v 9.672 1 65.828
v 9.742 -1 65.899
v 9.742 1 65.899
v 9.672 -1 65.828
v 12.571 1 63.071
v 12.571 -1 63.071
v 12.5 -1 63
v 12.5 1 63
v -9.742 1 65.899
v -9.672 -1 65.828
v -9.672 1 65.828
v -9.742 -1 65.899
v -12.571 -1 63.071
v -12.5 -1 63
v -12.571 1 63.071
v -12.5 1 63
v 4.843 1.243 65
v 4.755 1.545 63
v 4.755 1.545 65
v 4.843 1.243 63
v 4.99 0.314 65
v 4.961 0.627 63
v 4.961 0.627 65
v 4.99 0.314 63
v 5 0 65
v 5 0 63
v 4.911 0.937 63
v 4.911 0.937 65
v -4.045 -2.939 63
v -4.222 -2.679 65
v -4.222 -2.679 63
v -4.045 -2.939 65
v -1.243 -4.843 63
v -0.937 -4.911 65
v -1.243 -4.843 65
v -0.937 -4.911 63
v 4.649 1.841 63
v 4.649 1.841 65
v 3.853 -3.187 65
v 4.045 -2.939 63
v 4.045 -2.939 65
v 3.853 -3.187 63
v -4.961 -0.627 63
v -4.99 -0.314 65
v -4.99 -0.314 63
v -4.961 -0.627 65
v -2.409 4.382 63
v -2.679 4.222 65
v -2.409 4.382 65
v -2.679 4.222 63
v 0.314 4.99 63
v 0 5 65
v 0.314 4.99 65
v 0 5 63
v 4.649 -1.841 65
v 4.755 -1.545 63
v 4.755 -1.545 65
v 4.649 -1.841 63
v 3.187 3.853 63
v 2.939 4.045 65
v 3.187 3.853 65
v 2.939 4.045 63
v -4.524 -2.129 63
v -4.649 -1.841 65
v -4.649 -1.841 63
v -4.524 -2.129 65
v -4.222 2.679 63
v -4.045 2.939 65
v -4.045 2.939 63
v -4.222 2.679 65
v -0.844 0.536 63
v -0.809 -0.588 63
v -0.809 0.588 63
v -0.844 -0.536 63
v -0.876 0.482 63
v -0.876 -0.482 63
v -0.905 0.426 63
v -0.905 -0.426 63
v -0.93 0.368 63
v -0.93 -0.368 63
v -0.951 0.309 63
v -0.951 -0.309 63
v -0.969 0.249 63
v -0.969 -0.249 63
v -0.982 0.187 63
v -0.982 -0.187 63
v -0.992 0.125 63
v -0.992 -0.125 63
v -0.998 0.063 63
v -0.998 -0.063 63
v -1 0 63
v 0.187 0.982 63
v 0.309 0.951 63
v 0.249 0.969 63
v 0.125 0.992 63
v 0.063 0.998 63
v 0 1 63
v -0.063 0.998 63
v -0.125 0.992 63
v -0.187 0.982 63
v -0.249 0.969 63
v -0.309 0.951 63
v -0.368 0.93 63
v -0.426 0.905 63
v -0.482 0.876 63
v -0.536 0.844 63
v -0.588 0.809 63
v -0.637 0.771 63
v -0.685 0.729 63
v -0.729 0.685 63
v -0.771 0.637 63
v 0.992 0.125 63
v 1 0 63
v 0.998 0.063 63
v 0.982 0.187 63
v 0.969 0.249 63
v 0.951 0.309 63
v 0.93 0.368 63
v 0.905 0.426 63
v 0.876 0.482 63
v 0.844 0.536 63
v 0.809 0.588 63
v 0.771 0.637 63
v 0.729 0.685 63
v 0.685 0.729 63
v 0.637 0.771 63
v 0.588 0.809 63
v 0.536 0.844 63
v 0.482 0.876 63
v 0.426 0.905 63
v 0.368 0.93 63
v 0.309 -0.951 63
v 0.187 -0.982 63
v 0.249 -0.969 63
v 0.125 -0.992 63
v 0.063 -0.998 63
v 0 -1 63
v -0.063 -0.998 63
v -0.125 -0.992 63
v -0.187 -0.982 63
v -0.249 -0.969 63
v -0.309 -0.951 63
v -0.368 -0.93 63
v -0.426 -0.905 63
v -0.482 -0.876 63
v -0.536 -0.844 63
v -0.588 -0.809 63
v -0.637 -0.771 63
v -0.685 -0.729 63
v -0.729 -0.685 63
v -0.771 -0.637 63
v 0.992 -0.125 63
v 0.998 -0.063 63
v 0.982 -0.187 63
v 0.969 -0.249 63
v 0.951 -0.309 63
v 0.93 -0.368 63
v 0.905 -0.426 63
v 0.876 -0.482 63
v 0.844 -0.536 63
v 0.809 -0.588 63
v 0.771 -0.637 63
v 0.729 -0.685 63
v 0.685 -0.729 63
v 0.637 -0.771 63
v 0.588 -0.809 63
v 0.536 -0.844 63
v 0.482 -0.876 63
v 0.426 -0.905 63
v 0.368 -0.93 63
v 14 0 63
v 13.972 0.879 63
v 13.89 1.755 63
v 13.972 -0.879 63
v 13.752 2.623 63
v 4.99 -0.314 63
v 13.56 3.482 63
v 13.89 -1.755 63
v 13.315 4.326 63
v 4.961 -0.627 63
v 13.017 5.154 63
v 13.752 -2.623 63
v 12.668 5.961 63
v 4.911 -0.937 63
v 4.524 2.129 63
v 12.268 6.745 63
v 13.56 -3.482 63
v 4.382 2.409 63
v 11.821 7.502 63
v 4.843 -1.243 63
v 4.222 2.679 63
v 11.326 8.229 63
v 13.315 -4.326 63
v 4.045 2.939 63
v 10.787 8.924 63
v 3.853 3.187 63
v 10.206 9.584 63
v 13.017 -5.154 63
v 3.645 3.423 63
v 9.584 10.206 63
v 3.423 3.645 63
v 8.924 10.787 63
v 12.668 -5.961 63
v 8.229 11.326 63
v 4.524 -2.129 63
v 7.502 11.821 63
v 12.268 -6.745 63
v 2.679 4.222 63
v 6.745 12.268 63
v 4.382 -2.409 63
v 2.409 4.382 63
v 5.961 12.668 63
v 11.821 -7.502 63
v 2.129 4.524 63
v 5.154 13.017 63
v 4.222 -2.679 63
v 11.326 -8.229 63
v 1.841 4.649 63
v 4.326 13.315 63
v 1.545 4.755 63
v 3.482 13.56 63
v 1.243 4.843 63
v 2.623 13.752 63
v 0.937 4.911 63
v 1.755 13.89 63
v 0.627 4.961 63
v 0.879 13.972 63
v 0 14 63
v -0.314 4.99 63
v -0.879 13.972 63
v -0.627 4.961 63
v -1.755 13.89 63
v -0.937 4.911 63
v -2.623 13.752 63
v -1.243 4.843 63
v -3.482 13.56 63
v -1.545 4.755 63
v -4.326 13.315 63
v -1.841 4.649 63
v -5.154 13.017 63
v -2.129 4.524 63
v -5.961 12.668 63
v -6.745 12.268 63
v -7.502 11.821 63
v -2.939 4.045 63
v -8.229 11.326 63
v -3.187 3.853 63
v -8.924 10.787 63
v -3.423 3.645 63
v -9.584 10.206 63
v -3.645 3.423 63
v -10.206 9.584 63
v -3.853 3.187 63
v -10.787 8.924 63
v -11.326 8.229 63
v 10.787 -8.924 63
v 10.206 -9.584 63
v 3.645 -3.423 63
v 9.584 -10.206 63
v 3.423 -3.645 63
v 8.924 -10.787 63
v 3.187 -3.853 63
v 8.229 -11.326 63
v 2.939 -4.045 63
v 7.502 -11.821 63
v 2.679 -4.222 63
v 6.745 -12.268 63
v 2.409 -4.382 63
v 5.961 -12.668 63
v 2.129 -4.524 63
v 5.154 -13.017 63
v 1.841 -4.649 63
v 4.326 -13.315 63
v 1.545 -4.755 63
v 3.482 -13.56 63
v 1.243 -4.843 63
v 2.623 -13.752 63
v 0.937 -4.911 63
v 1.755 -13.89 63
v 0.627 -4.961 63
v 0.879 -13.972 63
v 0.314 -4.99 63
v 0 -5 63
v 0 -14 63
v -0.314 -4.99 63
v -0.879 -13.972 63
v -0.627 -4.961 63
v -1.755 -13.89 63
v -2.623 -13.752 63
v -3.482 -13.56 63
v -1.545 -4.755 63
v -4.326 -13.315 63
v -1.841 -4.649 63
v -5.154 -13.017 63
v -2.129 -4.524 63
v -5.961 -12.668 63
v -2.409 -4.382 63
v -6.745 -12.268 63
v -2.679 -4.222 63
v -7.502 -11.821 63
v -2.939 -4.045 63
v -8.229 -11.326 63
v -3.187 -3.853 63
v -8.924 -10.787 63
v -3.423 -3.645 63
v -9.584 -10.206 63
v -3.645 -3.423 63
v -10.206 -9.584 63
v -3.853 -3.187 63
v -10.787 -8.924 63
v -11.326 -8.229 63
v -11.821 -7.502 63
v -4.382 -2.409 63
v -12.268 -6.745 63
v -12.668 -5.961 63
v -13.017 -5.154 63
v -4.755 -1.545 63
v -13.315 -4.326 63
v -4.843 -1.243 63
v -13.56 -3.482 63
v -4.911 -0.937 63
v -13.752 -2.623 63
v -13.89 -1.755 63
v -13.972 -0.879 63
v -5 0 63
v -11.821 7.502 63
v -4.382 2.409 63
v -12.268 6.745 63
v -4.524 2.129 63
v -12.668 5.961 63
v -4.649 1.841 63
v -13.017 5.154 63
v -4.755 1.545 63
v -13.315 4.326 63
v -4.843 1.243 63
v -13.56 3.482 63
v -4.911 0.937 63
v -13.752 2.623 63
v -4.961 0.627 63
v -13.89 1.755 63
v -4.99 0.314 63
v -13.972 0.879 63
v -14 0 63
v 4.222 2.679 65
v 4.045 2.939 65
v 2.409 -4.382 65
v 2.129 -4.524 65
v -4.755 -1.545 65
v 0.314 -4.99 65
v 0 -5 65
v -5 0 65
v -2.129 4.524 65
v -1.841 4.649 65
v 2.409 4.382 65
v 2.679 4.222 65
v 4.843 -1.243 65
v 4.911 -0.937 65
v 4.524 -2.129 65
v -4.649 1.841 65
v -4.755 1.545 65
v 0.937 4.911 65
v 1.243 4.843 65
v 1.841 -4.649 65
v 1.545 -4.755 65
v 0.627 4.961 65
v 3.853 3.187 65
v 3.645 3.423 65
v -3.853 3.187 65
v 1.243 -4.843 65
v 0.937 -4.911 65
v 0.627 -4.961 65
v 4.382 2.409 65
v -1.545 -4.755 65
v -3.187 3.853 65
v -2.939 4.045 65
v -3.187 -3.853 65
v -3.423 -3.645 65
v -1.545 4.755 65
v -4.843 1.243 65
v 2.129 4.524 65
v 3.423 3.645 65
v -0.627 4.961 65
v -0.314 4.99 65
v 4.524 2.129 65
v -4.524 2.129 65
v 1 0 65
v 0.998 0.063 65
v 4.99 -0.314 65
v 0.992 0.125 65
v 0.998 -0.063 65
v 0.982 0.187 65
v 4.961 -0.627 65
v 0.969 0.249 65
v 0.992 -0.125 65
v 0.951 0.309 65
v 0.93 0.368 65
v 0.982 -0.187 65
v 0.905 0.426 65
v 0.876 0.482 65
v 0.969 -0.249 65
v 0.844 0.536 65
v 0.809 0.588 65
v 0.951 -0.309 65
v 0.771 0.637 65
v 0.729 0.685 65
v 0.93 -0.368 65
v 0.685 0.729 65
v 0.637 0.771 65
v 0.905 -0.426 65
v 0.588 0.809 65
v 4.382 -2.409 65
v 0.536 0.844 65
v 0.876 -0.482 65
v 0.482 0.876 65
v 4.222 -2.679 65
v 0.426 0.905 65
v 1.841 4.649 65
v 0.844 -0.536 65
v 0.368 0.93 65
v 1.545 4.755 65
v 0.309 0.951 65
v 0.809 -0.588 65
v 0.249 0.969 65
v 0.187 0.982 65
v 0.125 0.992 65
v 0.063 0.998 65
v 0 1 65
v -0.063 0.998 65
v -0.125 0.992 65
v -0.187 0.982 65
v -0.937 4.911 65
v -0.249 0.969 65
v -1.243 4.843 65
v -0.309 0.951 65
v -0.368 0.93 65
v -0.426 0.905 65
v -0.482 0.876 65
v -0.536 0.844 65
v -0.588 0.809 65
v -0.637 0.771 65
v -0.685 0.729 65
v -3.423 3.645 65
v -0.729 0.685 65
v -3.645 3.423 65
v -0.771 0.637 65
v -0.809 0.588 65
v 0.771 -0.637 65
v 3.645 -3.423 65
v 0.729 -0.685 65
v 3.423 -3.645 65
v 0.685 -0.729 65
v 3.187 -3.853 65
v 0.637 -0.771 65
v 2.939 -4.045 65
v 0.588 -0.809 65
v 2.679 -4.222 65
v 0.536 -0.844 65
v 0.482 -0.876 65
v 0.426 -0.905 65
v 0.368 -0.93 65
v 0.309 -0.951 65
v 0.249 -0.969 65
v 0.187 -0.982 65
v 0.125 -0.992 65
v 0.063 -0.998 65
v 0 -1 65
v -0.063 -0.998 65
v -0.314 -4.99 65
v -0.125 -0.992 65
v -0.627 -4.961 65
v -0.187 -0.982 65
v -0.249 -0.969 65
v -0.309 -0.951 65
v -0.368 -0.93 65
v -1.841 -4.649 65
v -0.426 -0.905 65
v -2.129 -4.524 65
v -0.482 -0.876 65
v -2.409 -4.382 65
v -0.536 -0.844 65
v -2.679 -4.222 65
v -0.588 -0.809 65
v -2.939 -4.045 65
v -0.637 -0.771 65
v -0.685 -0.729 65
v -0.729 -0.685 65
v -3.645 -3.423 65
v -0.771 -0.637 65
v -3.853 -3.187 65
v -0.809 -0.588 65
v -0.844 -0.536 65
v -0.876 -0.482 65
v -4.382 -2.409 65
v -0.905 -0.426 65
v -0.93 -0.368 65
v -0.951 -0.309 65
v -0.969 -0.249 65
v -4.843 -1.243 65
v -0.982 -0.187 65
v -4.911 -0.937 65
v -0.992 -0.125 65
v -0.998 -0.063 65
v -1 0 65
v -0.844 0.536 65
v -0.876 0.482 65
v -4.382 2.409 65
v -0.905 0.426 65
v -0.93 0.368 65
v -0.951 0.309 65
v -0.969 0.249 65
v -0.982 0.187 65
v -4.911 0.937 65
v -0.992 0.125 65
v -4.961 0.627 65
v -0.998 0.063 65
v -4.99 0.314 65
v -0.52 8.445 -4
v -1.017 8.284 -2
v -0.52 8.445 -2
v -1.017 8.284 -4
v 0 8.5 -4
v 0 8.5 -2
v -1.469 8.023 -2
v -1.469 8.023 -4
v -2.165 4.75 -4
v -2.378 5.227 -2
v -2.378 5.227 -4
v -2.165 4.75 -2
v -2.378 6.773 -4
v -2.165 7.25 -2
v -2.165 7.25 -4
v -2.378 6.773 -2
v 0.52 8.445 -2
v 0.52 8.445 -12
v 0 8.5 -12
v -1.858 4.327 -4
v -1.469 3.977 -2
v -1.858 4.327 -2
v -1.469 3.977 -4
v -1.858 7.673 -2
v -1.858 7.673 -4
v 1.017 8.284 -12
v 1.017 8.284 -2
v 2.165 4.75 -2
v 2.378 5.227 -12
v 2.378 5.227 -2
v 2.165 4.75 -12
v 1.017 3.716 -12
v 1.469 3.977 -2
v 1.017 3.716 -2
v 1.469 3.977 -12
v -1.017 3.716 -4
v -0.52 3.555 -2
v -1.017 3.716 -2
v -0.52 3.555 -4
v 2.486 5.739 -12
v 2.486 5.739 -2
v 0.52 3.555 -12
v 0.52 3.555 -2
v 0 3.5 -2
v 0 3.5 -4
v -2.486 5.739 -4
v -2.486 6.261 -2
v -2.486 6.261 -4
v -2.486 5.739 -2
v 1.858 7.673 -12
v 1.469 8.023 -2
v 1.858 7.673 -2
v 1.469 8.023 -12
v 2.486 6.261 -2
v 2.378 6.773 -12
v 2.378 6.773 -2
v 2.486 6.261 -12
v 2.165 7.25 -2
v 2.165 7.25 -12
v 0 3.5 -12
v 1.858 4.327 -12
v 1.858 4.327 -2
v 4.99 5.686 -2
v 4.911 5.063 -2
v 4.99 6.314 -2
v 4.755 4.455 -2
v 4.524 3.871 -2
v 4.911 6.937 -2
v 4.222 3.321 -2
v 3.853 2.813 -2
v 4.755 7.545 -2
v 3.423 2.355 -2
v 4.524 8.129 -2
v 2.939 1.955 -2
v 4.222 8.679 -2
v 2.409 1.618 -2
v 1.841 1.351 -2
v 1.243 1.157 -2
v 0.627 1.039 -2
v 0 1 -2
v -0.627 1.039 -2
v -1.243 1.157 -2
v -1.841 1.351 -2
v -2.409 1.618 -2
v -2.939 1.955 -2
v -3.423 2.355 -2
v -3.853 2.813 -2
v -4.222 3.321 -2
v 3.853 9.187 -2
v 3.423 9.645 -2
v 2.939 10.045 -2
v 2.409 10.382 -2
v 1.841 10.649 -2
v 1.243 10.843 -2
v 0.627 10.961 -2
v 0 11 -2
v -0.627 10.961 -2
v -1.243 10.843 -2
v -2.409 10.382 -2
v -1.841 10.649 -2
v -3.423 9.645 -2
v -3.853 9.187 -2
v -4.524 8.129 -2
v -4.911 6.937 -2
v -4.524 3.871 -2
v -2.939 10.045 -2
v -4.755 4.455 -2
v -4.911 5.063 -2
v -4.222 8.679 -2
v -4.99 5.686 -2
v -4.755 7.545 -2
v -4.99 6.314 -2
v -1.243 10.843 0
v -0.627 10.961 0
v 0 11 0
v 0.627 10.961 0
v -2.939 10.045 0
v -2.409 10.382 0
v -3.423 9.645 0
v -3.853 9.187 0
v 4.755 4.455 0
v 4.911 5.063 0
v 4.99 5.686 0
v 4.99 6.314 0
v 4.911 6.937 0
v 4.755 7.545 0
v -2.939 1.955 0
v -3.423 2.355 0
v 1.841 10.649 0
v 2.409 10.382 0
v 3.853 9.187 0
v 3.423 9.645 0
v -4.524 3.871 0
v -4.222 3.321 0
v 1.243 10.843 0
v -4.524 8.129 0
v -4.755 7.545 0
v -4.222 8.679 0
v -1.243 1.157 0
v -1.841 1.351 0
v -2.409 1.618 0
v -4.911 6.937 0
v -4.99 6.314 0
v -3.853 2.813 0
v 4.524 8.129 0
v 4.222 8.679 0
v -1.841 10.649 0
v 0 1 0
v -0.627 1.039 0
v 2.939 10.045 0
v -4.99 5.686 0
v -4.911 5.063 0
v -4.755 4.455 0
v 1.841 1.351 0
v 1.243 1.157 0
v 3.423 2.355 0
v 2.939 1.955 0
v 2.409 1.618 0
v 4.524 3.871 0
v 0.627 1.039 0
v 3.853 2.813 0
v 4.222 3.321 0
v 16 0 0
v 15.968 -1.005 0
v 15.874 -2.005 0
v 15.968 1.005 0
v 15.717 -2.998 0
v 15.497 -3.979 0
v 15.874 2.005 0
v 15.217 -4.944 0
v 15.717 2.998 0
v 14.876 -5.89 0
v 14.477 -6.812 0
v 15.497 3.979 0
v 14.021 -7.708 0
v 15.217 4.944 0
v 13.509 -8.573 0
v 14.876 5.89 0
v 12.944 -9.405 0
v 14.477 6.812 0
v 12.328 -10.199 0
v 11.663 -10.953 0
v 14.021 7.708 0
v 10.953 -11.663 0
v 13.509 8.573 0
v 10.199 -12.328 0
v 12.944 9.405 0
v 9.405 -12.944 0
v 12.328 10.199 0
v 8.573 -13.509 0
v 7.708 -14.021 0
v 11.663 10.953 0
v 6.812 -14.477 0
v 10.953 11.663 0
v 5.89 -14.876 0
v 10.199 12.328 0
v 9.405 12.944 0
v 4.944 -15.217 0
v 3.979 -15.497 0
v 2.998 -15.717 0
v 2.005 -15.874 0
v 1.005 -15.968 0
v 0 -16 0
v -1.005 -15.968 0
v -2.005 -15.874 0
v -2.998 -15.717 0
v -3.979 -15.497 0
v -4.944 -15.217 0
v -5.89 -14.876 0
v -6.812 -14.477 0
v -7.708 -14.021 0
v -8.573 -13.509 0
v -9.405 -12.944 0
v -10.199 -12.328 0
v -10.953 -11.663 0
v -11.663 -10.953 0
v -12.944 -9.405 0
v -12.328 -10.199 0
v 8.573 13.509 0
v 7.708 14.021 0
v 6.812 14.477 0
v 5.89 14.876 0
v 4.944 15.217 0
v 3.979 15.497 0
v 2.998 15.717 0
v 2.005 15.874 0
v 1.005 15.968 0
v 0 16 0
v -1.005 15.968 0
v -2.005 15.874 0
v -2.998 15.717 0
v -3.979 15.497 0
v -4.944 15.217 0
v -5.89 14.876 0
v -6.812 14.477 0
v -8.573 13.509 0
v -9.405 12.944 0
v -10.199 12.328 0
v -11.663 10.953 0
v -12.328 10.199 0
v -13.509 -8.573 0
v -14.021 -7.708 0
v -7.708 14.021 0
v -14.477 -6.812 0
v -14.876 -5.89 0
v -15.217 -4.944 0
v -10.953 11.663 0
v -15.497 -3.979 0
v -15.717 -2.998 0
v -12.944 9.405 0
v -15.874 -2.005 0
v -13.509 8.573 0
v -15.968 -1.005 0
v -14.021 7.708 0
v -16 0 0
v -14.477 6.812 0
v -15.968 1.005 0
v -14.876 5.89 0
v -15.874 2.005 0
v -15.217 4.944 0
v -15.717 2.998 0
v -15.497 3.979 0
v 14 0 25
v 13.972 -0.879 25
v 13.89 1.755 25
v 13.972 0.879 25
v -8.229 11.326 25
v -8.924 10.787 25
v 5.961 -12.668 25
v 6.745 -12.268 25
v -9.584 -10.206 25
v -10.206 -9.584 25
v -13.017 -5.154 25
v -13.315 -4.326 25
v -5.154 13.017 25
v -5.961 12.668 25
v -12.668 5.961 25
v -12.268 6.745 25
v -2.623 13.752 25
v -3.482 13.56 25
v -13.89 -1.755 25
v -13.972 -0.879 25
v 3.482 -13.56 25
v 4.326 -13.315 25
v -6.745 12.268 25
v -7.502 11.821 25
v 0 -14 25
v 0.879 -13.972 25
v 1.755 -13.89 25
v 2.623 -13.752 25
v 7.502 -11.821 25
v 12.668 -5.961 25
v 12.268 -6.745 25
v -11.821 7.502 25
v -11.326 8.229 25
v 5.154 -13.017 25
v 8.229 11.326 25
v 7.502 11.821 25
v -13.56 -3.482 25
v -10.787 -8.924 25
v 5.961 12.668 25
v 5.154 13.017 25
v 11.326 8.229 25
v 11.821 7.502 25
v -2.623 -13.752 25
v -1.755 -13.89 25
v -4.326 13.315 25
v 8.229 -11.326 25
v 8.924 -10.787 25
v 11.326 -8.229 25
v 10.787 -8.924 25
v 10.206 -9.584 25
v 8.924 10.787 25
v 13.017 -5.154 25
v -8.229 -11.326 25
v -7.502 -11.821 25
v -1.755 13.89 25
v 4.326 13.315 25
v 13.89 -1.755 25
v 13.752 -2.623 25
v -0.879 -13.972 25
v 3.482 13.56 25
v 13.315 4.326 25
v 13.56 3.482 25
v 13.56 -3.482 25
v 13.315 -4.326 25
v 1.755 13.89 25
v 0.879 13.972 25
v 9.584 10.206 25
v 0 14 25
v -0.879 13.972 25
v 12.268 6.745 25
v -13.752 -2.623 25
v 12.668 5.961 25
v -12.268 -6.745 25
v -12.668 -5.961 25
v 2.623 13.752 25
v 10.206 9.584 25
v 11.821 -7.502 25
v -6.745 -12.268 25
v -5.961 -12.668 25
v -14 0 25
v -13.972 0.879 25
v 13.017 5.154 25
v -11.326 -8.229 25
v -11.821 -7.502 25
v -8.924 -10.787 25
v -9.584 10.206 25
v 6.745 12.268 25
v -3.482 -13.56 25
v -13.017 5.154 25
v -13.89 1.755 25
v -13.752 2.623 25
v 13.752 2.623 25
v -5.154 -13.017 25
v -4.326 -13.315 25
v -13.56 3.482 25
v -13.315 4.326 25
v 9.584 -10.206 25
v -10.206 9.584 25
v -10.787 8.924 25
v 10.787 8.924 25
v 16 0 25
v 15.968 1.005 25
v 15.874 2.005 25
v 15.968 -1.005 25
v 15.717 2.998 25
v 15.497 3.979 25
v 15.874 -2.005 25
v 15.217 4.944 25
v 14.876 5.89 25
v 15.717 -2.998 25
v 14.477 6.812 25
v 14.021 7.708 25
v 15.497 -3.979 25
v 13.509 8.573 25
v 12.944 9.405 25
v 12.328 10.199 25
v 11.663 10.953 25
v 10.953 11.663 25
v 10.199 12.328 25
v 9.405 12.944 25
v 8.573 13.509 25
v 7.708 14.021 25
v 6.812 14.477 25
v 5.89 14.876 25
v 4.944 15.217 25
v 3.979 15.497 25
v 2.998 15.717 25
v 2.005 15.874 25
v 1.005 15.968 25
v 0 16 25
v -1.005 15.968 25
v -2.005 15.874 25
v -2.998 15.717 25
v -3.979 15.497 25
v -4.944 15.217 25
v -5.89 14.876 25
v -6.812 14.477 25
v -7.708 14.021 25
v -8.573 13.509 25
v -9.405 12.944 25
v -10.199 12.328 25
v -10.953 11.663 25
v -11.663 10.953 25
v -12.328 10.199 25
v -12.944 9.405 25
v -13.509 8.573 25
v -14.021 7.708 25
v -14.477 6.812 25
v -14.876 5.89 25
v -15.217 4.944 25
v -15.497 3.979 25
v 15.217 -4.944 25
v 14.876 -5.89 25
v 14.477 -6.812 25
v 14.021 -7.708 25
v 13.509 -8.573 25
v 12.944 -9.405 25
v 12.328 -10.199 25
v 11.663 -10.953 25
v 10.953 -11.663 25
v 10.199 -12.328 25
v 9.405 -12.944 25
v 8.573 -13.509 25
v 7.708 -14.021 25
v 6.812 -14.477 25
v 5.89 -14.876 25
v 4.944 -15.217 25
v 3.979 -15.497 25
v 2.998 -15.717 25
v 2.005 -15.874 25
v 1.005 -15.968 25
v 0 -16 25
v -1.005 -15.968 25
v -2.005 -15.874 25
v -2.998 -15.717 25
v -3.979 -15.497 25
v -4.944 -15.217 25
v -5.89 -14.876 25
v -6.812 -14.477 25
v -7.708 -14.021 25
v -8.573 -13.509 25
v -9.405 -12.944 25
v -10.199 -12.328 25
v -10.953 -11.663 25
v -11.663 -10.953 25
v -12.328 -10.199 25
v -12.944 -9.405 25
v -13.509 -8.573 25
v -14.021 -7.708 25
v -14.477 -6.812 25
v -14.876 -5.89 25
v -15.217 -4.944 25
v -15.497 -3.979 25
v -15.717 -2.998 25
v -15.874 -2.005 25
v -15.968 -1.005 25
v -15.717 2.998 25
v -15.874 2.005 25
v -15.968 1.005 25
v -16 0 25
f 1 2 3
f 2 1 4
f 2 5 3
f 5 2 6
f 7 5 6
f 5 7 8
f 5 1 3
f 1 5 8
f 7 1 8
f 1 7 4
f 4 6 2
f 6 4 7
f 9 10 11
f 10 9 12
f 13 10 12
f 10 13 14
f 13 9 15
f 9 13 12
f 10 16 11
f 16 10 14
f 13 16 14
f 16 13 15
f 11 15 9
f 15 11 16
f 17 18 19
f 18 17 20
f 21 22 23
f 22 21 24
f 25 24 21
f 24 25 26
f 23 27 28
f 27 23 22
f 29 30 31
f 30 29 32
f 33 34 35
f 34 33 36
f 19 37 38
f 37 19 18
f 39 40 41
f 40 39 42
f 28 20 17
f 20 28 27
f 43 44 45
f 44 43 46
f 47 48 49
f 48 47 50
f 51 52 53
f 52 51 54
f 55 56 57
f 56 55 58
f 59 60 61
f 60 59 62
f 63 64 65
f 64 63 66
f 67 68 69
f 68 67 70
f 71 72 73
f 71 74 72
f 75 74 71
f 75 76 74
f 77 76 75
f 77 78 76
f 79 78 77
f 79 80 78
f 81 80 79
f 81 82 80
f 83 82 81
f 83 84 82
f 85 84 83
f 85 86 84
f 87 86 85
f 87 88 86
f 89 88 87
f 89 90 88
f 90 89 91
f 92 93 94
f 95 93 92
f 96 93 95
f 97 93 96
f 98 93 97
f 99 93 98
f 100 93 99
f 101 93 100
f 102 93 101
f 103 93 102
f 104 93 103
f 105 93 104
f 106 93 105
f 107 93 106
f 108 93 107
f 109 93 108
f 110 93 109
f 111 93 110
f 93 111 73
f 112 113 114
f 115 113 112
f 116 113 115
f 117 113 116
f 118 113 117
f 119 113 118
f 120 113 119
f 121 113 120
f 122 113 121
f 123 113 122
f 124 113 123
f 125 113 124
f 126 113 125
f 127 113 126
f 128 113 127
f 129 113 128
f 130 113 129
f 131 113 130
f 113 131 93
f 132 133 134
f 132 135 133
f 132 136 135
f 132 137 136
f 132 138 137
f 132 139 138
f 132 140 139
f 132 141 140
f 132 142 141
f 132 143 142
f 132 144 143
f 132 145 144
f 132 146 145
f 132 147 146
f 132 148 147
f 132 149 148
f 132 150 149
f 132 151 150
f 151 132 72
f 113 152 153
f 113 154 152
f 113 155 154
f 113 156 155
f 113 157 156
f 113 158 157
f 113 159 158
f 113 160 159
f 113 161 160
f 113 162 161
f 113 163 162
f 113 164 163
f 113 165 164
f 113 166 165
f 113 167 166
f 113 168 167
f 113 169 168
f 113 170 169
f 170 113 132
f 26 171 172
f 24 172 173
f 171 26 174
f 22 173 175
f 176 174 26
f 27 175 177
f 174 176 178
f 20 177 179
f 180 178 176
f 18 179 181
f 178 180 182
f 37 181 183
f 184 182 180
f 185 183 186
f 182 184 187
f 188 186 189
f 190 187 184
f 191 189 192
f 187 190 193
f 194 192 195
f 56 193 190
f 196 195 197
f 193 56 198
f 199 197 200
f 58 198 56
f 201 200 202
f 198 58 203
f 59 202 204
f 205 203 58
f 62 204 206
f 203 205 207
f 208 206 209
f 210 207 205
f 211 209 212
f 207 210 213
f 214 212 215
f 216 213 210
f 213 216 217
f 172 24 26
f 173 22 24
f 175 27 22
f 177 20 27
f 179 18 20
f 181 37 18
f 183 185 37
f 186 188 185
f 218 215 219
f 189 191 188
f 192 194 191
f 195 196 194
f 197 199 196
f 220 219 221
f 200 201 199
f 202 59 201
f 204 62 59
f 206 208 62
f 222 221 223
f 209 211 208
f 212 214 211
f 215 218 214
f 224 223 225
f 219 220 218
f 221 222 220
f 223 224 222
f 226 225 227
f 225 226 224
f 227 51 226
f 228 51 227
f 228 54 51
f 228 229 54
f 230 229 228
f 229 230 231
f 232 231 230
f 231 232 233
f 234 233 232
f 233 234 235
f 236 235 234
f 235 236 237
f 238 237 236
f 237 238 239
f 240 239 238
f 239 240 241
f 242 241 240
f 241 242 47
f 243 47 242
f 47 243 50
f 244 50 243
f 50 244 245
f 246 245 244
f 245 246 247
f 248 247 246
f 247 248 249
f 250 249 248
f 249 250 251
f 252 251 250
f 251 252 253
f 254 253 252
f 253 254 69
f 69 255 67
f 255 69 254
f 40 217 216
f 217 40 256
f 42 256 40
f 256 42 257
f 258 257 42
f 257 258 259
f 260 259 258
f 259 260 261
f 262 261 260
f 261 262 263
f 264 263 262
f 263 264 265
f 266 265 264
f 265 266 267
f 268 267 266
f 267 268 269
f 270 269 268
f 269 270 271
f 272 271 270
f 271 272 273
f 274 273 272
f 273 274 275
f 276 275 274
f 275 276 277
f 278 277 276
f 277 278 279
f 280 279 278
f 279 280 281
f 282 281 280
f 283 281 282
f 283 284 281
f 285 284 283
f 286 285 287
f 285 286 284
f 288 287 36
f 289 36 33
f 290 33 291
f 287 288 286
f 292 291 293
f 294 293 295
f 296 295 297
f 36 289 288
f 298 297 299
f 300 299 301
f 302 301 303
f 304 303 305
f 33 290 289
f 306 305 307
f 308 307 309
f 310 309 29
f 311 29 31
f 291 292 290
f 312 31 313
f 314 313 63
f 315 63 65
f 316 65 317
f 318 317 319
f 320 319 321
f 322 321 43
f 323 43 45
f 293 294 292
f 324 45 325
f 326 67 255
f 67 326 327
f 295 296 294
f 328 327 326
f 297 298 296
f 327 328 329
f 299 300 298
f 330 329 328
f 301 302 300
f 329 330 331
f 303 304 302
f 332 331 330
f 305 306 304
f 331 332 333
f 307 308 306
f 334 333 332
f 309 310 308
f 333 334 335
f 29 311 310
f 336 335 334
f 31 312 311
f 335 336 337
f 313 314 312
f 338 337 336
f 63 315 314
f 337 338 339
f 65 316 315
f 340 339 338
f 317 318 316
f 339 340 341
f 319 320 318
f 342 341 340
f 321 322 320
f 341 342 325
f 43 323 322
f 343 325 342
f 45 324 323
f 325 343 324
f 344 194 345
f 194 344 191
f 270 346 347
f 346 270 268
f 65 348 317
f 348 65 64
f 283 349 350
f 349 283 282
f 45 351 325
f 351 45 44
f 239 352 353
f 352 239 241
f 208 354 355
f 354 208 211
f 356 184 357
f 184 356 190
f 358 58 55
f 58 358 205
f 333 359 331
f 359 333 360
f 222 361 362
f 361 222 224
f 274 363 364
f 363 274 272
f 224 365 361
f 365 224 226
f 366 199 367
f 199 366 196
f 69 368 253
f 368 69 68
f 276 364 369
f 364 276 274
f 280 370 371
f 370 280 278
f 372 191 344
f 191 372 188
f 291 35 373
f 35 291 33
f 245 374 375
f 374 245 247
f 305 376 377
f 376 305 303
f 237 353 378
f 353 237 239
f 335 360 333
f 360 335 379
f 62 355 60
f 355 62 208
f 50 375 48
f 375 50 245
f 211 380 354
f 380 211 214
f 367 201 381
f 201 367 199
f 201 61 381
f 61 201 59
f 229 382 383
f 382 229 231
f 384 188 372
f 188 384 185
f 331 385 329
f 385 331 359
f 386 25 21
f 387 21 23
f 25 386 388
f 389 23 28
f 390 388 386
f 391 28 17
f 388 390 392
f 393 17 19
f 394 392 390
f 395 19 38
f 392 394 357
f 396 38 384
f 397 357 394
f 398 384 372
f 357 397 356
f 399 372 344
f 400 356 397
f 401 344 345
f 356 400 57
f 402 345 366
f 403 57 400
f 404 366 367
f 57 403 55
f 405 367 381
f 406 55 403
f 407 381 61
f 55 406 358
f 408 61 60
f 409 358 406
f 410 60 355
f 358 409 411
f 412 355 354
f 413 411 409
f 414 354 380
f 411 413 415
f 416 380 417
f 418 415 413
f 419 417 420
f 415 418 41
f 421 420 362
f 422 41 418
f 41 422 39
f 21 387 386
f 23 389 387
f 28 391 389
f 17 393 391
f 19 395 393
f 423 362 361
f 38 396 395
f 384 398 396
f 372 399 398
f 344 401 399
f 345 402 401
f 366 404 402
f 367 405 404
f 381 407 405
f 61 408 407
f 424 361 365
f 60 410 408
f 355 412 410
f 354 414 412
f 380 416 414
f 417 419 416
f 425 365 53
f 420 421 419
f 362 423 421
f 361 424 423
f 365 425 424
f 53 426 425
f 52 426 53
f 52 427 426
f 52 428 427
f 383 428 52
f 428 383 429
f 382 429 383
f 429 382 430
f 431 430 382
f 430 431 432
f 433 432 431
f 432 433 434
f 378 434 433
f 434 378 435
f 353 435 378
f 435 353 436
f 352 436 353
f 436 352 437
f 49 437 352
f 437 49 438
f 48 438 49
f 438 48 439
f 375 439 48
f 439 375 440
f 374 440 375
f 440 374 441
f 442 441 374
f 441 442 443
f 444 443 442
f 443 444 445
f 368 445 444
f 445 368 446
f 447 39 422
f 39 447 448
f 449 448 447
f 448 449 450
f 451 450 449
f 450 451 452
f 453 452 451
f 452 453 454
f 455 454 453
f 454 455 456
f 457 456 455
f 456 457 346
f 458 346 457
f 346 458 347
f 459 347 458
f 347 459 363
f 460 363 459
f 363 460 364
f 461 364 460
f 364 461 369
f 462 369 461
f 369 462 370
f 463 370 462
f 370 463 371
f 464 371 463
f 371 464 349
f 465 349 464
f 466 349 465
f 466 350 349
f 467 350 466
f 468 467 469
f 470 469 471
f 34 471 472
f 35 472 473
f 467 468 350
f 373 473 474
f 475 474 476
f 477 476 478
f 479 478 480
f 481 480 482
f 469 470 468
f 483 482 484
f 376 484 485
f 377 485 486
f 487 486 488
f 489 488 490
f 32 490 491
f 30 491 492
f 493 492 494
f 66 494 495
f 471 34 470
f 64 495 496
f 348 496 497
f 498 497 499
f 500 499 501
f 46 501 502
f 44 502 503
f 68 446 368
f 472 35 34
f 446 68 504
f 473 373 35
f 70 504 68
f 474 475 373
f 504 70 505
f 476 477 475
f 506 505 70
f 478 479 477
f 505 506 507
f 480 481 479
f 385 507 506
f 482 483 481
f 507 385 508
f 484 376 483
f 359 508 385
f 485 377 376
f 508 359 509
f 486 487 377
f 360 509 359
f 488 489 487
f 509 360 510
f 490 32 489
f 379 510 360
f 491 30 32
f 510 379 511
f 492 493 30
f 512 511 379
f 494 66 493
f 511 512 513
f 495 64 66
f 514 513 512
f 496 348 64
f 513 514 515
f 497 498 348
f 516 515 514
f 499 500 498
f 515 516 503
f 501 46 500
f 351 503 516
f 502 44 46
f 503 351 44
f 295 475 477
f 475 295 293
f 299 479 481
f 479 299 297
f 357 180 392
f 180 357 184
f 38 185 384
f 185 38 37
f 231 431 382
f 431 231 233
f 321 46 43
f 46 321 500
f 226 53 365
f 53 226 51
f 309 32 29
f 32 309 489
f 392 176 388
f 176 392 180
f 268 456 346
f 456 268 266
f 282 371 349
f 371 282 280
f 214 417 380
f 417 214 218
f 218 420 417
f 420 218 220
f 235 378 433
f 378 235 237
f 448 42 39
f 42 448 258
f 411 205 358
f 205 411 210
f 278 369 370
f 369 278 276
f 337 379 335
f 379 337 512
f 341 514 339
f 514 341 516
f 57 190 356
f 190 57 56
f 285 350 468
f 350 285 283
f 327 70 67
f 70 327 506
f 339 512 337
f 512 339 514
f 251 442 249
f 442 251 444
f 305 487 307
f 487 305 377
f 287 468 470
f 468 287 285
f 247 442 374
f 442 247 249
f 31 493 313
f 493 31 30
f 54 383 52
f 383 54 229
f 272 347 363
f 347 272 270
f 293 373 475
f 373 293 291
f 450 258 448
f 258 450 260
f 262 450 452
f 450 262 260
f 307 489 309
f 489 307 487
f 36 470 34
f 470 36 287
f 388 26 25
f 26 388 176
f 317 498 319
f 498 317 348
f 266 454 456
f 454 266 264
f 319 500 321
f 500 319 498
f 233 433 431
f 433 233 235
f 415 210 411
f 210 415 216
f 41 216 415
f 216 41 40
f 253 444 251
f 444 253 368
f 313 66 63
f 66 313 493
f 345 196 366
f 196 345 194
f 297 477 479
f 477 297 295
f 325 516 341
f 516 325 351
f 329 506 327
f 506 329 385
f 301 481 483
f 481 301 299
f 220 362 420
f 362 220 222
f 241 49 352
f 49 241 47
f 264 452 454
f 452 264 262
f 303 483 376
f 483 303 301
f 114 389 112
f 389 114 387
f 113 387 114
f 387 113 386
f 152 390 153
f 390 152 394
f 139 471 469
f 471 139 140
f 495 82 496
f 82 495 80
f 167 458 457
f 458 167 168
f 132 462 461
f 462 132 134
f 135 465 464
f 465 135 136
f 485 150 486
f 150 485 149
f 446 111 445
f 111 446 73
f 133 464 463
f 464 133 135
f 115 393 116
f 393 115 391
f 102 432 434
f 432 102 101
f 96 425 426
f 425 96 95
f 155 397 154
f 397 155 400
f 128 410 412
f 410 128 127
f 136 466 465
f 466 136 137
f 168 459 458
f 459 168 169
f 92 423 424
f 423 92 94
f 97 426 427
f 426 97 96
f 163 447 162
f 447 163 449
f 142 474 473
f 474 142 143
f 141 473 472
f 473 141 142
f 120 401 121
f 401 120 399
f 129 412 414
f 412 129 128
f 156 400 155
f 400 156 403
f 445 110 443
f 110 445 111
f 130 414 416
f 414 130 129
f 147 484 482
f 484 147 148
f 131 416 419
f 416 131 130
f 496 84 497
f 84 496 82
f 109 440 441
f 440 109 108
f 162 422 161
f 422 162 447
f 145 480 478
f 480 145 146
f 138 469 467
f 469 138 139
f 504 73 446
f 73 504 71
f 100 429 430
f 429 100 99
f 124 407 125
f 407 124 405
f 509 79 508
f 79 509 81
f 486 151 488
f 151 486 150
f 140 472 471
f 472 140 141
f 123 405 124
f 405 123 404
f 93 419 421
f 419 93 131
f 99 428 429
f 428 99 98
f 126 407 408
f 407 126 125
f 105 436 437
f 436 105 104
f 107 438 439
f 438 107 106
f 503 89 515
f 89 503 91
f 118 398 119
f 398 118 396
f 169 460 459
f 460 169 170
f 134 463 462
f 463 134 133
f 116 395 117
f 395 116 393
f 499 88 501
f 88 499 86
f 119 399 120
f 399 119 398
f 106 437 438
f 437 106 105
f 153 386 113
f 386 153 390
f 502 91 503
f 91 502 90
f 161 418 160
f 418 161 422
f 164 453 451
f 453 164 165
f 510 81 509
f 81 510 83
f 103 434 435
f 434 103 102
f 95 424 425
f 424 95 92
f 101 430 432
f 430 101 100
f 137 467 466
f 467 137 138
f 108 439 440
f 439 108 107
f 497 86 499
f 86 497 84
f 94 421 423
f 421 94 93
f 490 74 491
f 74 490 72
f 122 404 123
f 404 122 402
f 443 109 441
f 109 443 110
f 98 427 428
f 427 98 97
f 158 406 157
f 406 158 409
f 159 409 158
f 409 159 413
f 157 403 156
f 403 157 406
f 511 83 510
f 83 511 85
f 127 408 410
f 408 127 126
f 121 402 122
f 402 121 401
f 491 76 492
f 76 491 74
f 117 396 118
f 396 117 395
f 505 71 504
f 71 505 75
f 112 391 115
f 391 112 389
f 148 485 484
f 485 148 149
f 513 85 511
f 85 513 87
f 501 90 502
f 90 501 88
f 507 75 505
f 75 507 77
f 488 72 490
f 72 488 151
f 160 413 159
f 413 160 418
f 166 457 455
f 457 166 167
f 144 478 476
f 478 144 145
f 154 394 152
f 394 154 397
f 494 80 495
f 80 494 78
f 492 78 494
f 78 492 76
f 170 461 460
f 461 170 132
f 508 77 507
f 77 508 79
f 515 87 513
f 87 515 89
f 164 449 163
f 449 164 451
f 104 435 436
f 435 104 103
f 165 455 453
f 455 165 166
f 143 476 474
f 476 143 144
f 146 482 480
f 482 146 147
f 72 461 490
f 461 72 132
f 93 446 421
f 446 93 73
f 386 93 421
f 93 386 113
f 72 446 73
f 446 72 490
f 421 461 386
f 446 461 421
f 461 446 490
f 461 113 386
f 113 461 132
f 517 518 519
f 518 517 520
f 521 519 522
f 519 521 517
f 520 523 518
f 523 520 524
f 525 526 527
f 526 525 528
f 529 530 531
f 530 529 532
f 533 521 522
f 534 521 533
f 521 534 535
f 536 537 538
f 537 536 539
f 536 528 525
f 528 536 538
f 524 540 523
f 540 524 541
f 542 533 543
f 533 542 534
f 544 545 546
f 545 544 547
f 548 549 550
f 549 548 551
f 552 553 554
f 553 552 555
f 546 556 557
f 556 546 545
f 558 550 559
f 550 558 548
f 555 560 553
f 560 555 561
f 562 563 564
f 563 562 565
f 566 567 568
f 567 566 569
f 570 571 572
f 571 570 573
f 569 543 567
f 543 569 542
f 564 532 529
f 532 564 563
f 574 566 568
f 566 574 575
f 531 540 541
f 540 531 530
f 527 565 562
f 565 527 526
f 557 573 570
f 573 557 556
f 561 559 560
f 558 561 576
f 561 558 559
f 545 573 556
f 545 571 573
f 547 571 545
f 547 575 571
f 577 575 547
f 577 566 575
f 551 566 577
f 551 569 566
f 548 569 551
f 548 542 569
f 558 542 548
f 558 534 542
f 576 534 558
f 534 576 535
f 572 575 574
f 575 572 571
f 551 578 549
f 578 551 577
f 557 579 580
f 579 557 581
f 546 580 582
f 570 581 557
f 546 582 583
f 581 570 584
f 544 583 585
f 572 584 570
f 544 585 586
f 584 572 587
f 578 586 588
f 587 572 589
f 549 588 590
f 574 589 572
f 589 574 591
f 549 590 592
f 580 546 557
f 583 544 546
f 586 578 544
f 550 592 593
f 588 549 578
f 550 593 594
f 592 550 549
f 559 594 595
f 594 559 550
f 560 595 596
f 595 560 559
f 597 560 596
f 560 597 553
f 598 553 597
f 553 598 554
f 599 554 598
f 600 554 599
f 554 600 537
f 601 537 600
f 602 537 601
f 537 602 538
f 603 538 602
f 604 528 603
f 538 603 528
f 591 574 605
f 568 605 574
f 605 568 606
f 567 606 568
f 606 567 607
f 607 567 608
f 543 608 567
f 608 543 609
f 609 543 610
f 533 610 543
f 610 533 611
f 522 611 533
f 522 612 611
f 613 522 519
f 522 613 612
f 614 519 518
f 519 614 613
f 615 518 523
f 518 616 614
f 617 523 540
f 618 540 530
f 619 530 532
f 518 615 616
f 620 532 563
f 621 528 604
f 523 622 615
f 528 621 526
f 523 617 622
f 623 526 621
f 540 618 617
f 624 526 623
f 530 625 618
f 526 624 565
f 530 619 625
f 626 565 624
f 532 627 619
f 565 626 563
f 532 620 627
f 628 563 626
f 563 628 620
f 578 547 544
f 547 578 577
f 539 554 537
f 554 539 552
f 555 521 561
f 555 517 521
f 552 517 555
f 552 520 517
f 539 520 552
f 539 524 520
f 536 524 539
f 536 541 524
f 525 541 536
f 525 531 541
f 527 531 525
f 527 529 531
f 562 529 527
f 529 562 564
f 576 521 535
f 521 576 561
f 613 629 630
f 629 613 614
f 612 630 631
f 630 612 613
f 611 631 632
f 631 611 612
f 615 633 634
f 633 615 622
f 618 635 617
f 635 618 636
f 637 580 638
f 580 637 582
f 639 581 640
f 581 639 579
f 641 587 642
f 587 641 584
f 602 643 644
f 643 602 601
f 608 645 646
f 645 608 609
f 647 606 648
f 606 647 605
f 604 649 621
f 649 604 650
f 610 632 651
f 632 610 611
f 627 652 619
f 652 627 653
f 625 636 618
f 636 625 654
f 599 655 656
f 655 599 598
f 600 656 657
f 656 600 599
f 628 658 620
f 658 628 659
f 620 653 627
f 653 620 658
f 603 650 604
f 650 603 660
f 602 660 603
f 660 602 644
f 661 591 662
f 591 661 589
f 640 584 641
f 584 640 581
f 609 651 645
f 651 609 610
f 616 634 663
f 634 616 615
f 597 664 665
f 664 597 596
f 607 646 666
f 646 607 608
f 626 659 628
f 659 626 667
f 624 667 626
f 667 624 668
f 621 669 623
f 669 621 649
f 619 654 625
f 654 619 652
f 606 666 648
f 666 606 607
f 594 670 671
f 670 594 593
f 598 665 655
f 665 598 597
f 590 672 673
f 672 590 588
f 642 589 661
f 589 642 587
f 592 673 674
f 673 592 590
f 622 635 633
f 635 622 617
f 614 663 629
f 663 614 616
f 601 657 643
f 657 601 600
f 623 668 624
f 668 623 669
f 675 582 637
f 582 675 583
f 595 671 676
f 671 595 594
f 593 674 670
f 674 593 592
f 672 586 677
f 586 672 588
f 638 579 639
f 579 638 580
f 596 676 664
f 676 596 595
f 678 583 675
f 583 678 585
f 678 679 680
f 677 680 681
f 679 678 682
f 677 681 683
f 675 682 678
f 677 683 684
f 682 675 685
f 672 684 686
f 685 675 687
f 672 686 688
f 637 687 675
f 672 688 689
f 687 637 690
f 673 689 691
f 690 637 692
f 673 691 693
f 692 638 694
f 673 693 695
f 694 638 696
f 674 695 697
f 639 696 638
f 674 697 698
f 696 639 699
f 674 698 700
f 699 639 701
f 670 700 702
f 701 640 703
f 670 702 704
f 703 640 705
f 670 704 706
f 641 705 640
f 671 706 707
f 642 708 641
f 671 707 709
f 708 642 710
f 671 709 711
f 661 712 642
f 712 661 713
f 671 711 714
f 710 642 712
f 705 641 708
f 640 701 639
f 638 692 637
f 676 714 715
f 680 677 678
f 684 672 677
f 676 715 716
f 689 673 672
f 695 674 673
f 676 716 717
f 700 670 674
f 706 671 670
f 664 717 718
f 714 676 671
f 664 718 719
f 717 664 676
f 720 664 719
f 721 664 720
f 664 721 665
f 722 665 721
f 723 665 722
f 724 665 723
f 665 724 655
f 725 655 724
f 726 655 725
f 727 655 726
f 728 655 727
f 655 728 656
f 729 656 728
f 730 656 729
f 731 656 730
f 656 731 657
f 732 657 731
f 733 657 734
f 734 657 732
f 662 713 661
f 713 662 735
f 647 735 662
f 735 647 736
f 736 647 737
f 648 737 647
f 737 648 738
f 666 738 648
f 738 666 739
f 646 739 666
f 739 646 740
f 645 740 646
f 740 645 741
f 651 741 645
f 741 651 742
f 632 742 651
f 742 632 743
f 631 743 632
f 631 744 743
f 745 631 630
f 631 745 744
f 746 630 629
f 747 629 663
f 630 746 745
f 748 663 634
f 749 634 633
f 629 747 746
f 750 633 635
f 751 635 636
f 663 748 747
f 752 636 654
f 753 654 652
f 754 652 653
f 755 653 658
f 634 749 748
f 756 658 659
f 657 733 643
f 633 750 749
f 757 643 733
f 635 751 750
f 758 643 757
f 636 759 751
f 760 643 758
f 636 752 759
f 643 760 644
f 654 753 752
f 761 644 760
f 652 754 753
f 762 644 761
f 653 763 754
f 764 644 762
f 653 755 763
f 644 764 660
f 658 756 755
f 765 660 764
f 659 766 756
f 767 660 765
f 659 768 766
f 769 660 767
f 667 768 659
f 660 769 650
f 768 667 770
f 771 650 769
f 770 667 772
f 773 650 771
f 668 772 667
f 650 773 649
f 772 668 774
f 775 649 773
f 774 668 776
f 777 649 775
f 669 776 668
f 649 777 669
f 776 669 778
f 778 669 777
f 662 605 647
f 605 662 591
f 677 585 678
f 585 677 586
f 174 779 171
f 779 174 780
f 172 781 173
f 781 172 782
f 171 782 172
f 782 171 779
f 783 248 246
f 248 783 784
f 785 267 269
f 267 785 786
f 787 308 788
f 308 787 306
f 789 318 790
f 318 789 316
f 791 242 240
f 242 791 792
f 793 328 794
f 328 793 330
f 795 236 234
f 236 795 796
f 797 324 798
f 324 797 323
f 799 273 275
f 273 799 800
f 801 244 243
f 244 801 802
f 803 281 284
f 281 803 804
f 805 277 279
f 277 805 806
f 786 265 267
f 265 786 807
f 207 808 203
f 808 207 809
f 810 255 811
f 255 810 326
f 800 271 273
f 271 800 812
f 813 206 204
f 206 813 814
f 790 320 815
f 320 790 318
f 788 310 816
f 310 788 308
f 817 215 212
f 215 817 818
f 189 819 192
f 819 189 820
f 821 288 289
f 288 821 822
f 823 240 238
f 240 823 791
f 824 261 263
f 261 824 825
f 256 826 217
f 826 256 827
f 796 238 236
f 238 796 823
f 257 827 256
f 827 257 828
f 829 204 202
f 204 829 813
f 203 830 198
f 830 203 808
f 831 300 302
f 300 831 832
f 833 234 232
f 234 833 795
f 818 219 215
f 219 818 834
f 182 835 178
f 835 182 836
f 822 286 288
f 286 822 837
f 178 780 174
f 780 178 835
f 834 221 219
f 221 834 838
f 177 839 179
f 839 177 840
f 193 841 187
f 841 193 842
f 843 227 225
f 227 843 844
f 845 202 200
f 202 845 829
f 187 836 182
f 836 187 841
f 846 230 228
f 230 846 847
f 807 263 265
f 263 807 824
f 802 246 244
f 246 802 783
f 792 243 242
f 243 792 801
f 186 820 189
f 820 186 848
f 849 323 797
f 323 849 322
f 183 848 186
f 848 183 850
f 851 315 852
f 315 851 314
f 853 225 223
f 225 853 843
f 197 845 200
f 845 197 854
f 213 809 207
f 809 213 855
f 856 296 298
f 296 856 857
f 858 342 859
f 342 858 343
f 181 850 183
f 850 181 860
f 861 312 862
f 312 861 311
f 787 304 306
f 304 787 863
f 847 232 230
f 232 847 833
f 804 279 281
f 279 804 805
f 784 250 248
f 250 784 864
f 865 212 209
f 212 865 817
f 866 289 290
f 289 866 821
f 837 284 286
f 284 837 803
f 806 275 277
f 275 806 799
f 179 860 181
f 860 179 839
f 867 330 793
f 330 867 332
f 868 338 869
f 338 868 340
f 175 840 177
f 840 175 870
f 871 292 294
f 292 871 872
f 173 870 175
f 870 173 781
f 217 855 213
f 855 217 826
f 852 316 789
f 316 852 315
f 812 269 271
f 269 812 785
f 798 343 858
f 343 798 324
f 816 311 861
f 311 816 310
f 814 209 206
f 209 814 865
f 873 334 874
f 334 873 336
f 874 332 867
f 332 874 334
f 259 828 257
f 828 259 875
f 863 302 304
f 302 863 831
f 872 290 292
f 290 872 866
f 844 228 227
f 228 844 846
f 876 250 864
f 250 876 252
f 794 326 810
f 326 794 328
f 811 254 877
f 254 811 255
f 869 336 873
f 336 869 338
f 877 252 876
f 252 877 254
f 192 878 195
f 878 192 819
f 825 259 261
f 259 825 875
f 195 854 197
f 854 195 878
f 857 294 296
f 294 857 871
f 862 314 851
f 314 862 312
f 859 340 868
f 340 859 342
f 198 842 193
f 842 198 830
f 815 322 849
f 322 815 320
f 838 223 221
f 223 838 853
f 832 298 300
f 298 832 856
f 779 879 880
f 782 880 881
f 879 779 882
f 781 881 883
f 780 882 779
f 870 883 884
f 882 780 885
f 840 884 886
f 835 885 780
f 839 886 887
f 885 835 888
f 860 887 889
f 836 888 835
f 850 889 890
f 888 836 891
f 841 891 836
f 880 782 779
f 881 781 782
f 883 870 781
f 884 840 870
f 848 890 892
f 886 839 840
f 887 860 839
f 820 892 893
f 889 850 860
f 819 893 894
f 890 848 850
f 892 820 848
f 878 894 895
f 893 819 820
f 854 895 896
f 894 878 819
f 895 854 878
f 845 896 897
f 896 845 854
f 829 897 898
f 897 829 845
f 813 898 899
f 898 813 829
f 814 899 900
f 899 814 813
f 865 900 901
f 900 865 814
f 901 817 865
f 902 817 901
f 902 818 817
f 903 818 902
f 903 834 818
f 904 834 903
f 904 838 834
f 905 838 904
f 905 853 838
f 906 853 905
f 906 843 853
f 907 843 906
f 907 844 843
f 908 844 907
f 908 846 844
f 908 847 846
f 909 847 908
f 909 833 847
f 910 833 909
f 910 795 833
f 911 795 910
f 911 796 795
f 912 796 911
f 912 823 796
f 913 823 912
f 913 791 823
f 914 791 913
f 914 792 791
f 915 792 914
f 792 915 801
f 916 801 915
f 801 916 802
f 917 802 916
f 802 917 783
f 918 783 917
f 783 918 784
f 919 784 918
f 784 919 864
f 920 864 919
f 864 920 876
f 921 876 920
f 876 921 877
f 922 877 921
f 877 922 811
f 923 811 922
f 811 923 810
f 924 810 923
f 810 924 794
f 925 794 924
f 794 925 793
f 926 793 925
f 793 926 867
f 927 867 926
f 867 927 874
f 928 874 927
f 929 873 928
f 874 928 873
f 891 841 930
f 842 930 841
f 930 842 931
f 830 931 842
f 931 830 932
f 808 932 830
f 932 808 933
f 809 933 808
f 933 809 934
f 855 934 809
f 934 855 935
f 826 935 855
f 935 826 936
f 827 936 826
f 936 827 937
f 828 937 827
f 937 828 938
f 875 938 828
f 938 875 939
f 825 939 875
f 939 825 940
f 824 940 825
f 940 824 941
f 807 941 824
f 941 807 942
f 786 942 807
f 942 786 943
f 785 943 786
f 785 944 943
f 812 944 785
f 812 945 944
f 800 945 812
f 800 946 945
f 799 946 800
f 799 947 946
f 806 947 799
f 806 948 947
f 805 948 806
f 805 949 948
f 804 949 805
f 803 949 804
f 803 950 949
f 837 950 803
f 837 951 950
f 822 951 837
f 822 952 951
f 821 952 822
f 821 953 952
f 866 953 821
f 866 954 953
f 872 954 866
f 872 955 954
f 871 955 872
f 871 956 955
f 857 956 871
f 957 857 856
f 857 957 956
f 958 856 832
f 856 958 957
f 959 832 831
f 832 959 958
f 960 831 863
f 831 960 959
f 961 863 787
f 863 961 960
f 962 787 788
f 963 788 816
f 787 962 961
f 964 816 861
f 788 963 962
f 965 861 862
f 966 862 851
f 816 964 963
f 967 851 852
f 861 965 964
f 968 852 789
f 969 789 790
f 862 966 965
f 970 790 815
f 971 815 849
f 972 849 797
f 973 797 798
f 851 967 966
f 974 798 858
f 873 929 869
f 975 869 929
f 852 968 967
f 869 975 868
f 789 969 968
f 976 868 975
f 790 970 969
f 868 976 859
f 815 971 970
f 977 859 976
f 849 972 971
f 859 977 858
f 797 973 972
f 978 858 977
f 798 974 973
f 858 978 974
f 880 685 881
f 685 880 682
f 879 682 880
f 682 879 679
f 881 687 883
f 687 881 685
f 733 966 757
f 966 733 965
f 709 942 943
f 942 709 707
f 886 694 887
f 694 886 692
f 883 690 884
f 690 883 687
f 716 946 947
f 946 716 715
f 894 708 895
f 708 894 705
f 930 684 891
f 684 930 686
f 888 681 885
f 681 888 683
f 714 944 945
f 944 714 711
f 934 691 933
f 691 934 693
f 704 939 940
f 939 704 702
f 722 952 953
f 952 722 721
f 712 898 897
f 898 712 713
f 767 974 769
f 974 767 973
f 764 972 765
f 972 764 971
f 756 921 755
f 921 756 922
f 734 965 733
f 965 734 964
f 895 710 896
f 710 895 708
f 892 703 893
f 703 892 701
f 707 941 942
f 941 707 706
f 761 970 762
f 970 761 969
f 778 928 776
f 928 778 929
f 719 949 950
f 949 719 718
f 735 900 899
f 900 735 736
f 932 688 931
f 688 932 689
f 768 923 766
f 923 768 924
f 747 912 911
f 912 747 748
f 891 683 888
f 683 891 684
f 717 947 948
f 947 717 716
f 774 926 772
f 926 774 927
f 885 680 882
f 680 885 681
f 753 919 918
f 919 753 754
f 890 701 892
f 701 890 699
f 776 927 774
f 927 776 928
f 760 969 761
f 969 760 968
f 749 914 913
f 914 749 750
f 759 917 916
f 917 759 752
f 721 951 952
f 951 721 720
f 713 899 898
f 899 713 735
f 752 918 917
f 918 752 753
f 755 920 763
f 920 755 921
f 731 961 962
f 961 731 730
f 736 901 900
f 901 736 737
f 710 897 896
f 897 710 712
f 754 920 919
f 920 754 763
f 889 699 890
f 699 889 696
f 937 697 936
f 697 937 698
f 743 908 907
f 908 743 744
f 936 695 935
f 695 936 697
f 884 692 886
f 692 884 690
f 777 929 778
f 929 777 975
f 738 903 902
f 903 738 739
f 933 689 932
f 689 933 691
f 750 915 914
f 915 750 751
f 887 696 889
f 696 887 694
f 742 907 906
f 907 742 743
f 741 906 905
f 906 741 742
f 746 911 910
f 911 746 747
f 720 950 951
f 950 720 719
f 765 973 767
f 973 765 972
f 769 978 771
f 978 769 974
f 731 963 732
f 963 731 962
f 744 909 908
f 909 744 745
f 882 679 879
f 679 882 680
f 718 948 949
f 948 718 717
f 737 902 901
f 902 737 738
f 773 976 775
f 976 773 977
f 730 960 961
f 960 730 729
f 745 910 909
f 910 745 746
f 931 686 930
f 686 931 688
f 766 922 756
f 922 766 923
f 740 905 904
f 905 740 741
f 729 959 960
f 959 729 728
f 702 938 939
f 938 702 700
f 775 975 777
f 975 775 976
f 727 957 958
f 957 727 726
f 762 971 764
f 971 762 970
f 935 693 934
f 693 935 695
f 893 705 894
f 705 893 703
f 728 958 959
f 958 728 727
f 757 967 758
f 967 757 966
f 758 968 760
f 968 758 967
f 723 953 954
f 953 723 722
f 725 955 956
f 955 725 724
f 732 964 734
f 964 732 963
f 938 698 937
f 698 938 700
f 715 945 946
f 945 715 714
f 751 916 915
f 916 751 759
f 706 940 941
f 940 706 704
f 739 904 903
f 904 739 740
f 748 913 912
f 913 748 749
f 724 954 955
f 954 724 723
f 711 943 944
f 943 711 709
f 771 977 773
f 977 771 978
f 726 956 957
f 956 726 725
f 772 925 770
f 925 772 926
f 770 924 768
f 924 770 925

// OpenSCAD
// file: bagues.scad
module bague_pleine(diametre, epaisseur) {
    cylinder(h=epaisseur, d=diametre, $fn=100);
}

module bague_creuse(d_e, d_i, epaisseur) {
    assert(d_e > d_i, "diametre extérieur doit être plus grand que diametre intérieur")
    difference() {
        cylinder(h=epaisseur, d=d_e);
        translate([0,0,-1]) cylinder(h=epaisseur+2, d=d_i);
    }
}

module bague_creuse_2(d_e, d_i, dec, epaisseur) {
    assert(d_e > d_i, "diametre extérieur doit être plus grand que diametre intérieur")
    difference() {
        cylinder(h=epaisseur, d=d_e);
        translate([dec,0,-1]) cylinder(h=epaisseur+2, d=d_i);
    }
}
// main file
use <bagues.scad>;

module diode(d=5) {
    translate([0,0,d]) 
    sphere(d=d, $fn=100);
    cylinder(d=d,h=d, $fn=100);
}
// diode();

module interrupteur(state="ON"){
    largeure  = 8;
    longueure = 14;
    hauteur   = 10;
    translate([0,0,5])
    union() {
        color("blue")
        cube(size=[largeure, longueure, hauteur], center=true);
        
        color("grey")
        translate([0, 0, hauteur/2-0.1]) 
        cube(size=[largeure+0.2, longueure+0.2, 0.4], center=true);
        
        color("grey")
        translate([0, 0, 2.6])
        cube(size=[largeure+0.2, longueure-1, 5], center=true);
        
        color("grey")
        translate([0,0,5]) 
        cylinder(d=4,h=1,$fn=30);
        
        translate([0,0,5])
        if (state=="ON"){
            rotate([30,0,0])
            union() {
                hauteur=6;
                diametre=2.5;
                color("grey")
                cylinder(d=diametre,h=hauteur,$fn=30);
                color("grey")
                translate([0,0,hauteur]) 
                sphere(d=diametre,$fn=30);
            }
        }else{
            rotate([-30,0,0])
            union() {
                hauteur=6;
                diametre=2.5;
                color("grey")
                cylinder(d=diametre,h=hauteur,$fn=30);
                color("grey")
                translate([0,0,hauteur]) 
                sphere(d=diametre,$fn=30);
            }
        }
    }
}
// interrupteur("ON");

module moteur_1(){
    for (i=[0:1:1]) {
        color("grey")
        rotate([0,0,i*180]) 
        translate([28/2-1.5, -1, 35+25+3])
        rotate([0,-45,0]) 
        cube(size=[0.1,2,4]);
    }
    
    translate([0, 0, 35+25+3])
    union(){
        color(c=[0.2,0.2,0.2,1])
        bague_creuse(d_e=10, d_i=2, epaisseur=2, $fn=100);
        color("grey")
        cylinder(d=2, h=2);
    }
    
    color(c=[0.2,0.2,0.2,1])
    translate([0, 0, 35+25])
    cylinder(d=28, h=3, $fn=100);
    
    color("DarkKhaki")
    translate([0, 0, 25])
    cylinder(d=28, h=35, $fn=100);
    
    color("Gray")
    translate([0, 0, 0])
    cylinder(d=32, h=25, $fn=100);
    
    rotate([0,0,90]) 
    translate([32/2-5-10/2, 0, -2])
    union() {
        color("Gray")
        cylinder(d=10, h=2, $fn=50);
        color("lightGray")
        translate([0,0,-10])
        difference(){
            cylinder(d=5, h=10, $fn=30);
            translate([0,5/2,2]) 
            cube(size=[6,5,12], center=true);
        }
    }
}
moteur_1();
